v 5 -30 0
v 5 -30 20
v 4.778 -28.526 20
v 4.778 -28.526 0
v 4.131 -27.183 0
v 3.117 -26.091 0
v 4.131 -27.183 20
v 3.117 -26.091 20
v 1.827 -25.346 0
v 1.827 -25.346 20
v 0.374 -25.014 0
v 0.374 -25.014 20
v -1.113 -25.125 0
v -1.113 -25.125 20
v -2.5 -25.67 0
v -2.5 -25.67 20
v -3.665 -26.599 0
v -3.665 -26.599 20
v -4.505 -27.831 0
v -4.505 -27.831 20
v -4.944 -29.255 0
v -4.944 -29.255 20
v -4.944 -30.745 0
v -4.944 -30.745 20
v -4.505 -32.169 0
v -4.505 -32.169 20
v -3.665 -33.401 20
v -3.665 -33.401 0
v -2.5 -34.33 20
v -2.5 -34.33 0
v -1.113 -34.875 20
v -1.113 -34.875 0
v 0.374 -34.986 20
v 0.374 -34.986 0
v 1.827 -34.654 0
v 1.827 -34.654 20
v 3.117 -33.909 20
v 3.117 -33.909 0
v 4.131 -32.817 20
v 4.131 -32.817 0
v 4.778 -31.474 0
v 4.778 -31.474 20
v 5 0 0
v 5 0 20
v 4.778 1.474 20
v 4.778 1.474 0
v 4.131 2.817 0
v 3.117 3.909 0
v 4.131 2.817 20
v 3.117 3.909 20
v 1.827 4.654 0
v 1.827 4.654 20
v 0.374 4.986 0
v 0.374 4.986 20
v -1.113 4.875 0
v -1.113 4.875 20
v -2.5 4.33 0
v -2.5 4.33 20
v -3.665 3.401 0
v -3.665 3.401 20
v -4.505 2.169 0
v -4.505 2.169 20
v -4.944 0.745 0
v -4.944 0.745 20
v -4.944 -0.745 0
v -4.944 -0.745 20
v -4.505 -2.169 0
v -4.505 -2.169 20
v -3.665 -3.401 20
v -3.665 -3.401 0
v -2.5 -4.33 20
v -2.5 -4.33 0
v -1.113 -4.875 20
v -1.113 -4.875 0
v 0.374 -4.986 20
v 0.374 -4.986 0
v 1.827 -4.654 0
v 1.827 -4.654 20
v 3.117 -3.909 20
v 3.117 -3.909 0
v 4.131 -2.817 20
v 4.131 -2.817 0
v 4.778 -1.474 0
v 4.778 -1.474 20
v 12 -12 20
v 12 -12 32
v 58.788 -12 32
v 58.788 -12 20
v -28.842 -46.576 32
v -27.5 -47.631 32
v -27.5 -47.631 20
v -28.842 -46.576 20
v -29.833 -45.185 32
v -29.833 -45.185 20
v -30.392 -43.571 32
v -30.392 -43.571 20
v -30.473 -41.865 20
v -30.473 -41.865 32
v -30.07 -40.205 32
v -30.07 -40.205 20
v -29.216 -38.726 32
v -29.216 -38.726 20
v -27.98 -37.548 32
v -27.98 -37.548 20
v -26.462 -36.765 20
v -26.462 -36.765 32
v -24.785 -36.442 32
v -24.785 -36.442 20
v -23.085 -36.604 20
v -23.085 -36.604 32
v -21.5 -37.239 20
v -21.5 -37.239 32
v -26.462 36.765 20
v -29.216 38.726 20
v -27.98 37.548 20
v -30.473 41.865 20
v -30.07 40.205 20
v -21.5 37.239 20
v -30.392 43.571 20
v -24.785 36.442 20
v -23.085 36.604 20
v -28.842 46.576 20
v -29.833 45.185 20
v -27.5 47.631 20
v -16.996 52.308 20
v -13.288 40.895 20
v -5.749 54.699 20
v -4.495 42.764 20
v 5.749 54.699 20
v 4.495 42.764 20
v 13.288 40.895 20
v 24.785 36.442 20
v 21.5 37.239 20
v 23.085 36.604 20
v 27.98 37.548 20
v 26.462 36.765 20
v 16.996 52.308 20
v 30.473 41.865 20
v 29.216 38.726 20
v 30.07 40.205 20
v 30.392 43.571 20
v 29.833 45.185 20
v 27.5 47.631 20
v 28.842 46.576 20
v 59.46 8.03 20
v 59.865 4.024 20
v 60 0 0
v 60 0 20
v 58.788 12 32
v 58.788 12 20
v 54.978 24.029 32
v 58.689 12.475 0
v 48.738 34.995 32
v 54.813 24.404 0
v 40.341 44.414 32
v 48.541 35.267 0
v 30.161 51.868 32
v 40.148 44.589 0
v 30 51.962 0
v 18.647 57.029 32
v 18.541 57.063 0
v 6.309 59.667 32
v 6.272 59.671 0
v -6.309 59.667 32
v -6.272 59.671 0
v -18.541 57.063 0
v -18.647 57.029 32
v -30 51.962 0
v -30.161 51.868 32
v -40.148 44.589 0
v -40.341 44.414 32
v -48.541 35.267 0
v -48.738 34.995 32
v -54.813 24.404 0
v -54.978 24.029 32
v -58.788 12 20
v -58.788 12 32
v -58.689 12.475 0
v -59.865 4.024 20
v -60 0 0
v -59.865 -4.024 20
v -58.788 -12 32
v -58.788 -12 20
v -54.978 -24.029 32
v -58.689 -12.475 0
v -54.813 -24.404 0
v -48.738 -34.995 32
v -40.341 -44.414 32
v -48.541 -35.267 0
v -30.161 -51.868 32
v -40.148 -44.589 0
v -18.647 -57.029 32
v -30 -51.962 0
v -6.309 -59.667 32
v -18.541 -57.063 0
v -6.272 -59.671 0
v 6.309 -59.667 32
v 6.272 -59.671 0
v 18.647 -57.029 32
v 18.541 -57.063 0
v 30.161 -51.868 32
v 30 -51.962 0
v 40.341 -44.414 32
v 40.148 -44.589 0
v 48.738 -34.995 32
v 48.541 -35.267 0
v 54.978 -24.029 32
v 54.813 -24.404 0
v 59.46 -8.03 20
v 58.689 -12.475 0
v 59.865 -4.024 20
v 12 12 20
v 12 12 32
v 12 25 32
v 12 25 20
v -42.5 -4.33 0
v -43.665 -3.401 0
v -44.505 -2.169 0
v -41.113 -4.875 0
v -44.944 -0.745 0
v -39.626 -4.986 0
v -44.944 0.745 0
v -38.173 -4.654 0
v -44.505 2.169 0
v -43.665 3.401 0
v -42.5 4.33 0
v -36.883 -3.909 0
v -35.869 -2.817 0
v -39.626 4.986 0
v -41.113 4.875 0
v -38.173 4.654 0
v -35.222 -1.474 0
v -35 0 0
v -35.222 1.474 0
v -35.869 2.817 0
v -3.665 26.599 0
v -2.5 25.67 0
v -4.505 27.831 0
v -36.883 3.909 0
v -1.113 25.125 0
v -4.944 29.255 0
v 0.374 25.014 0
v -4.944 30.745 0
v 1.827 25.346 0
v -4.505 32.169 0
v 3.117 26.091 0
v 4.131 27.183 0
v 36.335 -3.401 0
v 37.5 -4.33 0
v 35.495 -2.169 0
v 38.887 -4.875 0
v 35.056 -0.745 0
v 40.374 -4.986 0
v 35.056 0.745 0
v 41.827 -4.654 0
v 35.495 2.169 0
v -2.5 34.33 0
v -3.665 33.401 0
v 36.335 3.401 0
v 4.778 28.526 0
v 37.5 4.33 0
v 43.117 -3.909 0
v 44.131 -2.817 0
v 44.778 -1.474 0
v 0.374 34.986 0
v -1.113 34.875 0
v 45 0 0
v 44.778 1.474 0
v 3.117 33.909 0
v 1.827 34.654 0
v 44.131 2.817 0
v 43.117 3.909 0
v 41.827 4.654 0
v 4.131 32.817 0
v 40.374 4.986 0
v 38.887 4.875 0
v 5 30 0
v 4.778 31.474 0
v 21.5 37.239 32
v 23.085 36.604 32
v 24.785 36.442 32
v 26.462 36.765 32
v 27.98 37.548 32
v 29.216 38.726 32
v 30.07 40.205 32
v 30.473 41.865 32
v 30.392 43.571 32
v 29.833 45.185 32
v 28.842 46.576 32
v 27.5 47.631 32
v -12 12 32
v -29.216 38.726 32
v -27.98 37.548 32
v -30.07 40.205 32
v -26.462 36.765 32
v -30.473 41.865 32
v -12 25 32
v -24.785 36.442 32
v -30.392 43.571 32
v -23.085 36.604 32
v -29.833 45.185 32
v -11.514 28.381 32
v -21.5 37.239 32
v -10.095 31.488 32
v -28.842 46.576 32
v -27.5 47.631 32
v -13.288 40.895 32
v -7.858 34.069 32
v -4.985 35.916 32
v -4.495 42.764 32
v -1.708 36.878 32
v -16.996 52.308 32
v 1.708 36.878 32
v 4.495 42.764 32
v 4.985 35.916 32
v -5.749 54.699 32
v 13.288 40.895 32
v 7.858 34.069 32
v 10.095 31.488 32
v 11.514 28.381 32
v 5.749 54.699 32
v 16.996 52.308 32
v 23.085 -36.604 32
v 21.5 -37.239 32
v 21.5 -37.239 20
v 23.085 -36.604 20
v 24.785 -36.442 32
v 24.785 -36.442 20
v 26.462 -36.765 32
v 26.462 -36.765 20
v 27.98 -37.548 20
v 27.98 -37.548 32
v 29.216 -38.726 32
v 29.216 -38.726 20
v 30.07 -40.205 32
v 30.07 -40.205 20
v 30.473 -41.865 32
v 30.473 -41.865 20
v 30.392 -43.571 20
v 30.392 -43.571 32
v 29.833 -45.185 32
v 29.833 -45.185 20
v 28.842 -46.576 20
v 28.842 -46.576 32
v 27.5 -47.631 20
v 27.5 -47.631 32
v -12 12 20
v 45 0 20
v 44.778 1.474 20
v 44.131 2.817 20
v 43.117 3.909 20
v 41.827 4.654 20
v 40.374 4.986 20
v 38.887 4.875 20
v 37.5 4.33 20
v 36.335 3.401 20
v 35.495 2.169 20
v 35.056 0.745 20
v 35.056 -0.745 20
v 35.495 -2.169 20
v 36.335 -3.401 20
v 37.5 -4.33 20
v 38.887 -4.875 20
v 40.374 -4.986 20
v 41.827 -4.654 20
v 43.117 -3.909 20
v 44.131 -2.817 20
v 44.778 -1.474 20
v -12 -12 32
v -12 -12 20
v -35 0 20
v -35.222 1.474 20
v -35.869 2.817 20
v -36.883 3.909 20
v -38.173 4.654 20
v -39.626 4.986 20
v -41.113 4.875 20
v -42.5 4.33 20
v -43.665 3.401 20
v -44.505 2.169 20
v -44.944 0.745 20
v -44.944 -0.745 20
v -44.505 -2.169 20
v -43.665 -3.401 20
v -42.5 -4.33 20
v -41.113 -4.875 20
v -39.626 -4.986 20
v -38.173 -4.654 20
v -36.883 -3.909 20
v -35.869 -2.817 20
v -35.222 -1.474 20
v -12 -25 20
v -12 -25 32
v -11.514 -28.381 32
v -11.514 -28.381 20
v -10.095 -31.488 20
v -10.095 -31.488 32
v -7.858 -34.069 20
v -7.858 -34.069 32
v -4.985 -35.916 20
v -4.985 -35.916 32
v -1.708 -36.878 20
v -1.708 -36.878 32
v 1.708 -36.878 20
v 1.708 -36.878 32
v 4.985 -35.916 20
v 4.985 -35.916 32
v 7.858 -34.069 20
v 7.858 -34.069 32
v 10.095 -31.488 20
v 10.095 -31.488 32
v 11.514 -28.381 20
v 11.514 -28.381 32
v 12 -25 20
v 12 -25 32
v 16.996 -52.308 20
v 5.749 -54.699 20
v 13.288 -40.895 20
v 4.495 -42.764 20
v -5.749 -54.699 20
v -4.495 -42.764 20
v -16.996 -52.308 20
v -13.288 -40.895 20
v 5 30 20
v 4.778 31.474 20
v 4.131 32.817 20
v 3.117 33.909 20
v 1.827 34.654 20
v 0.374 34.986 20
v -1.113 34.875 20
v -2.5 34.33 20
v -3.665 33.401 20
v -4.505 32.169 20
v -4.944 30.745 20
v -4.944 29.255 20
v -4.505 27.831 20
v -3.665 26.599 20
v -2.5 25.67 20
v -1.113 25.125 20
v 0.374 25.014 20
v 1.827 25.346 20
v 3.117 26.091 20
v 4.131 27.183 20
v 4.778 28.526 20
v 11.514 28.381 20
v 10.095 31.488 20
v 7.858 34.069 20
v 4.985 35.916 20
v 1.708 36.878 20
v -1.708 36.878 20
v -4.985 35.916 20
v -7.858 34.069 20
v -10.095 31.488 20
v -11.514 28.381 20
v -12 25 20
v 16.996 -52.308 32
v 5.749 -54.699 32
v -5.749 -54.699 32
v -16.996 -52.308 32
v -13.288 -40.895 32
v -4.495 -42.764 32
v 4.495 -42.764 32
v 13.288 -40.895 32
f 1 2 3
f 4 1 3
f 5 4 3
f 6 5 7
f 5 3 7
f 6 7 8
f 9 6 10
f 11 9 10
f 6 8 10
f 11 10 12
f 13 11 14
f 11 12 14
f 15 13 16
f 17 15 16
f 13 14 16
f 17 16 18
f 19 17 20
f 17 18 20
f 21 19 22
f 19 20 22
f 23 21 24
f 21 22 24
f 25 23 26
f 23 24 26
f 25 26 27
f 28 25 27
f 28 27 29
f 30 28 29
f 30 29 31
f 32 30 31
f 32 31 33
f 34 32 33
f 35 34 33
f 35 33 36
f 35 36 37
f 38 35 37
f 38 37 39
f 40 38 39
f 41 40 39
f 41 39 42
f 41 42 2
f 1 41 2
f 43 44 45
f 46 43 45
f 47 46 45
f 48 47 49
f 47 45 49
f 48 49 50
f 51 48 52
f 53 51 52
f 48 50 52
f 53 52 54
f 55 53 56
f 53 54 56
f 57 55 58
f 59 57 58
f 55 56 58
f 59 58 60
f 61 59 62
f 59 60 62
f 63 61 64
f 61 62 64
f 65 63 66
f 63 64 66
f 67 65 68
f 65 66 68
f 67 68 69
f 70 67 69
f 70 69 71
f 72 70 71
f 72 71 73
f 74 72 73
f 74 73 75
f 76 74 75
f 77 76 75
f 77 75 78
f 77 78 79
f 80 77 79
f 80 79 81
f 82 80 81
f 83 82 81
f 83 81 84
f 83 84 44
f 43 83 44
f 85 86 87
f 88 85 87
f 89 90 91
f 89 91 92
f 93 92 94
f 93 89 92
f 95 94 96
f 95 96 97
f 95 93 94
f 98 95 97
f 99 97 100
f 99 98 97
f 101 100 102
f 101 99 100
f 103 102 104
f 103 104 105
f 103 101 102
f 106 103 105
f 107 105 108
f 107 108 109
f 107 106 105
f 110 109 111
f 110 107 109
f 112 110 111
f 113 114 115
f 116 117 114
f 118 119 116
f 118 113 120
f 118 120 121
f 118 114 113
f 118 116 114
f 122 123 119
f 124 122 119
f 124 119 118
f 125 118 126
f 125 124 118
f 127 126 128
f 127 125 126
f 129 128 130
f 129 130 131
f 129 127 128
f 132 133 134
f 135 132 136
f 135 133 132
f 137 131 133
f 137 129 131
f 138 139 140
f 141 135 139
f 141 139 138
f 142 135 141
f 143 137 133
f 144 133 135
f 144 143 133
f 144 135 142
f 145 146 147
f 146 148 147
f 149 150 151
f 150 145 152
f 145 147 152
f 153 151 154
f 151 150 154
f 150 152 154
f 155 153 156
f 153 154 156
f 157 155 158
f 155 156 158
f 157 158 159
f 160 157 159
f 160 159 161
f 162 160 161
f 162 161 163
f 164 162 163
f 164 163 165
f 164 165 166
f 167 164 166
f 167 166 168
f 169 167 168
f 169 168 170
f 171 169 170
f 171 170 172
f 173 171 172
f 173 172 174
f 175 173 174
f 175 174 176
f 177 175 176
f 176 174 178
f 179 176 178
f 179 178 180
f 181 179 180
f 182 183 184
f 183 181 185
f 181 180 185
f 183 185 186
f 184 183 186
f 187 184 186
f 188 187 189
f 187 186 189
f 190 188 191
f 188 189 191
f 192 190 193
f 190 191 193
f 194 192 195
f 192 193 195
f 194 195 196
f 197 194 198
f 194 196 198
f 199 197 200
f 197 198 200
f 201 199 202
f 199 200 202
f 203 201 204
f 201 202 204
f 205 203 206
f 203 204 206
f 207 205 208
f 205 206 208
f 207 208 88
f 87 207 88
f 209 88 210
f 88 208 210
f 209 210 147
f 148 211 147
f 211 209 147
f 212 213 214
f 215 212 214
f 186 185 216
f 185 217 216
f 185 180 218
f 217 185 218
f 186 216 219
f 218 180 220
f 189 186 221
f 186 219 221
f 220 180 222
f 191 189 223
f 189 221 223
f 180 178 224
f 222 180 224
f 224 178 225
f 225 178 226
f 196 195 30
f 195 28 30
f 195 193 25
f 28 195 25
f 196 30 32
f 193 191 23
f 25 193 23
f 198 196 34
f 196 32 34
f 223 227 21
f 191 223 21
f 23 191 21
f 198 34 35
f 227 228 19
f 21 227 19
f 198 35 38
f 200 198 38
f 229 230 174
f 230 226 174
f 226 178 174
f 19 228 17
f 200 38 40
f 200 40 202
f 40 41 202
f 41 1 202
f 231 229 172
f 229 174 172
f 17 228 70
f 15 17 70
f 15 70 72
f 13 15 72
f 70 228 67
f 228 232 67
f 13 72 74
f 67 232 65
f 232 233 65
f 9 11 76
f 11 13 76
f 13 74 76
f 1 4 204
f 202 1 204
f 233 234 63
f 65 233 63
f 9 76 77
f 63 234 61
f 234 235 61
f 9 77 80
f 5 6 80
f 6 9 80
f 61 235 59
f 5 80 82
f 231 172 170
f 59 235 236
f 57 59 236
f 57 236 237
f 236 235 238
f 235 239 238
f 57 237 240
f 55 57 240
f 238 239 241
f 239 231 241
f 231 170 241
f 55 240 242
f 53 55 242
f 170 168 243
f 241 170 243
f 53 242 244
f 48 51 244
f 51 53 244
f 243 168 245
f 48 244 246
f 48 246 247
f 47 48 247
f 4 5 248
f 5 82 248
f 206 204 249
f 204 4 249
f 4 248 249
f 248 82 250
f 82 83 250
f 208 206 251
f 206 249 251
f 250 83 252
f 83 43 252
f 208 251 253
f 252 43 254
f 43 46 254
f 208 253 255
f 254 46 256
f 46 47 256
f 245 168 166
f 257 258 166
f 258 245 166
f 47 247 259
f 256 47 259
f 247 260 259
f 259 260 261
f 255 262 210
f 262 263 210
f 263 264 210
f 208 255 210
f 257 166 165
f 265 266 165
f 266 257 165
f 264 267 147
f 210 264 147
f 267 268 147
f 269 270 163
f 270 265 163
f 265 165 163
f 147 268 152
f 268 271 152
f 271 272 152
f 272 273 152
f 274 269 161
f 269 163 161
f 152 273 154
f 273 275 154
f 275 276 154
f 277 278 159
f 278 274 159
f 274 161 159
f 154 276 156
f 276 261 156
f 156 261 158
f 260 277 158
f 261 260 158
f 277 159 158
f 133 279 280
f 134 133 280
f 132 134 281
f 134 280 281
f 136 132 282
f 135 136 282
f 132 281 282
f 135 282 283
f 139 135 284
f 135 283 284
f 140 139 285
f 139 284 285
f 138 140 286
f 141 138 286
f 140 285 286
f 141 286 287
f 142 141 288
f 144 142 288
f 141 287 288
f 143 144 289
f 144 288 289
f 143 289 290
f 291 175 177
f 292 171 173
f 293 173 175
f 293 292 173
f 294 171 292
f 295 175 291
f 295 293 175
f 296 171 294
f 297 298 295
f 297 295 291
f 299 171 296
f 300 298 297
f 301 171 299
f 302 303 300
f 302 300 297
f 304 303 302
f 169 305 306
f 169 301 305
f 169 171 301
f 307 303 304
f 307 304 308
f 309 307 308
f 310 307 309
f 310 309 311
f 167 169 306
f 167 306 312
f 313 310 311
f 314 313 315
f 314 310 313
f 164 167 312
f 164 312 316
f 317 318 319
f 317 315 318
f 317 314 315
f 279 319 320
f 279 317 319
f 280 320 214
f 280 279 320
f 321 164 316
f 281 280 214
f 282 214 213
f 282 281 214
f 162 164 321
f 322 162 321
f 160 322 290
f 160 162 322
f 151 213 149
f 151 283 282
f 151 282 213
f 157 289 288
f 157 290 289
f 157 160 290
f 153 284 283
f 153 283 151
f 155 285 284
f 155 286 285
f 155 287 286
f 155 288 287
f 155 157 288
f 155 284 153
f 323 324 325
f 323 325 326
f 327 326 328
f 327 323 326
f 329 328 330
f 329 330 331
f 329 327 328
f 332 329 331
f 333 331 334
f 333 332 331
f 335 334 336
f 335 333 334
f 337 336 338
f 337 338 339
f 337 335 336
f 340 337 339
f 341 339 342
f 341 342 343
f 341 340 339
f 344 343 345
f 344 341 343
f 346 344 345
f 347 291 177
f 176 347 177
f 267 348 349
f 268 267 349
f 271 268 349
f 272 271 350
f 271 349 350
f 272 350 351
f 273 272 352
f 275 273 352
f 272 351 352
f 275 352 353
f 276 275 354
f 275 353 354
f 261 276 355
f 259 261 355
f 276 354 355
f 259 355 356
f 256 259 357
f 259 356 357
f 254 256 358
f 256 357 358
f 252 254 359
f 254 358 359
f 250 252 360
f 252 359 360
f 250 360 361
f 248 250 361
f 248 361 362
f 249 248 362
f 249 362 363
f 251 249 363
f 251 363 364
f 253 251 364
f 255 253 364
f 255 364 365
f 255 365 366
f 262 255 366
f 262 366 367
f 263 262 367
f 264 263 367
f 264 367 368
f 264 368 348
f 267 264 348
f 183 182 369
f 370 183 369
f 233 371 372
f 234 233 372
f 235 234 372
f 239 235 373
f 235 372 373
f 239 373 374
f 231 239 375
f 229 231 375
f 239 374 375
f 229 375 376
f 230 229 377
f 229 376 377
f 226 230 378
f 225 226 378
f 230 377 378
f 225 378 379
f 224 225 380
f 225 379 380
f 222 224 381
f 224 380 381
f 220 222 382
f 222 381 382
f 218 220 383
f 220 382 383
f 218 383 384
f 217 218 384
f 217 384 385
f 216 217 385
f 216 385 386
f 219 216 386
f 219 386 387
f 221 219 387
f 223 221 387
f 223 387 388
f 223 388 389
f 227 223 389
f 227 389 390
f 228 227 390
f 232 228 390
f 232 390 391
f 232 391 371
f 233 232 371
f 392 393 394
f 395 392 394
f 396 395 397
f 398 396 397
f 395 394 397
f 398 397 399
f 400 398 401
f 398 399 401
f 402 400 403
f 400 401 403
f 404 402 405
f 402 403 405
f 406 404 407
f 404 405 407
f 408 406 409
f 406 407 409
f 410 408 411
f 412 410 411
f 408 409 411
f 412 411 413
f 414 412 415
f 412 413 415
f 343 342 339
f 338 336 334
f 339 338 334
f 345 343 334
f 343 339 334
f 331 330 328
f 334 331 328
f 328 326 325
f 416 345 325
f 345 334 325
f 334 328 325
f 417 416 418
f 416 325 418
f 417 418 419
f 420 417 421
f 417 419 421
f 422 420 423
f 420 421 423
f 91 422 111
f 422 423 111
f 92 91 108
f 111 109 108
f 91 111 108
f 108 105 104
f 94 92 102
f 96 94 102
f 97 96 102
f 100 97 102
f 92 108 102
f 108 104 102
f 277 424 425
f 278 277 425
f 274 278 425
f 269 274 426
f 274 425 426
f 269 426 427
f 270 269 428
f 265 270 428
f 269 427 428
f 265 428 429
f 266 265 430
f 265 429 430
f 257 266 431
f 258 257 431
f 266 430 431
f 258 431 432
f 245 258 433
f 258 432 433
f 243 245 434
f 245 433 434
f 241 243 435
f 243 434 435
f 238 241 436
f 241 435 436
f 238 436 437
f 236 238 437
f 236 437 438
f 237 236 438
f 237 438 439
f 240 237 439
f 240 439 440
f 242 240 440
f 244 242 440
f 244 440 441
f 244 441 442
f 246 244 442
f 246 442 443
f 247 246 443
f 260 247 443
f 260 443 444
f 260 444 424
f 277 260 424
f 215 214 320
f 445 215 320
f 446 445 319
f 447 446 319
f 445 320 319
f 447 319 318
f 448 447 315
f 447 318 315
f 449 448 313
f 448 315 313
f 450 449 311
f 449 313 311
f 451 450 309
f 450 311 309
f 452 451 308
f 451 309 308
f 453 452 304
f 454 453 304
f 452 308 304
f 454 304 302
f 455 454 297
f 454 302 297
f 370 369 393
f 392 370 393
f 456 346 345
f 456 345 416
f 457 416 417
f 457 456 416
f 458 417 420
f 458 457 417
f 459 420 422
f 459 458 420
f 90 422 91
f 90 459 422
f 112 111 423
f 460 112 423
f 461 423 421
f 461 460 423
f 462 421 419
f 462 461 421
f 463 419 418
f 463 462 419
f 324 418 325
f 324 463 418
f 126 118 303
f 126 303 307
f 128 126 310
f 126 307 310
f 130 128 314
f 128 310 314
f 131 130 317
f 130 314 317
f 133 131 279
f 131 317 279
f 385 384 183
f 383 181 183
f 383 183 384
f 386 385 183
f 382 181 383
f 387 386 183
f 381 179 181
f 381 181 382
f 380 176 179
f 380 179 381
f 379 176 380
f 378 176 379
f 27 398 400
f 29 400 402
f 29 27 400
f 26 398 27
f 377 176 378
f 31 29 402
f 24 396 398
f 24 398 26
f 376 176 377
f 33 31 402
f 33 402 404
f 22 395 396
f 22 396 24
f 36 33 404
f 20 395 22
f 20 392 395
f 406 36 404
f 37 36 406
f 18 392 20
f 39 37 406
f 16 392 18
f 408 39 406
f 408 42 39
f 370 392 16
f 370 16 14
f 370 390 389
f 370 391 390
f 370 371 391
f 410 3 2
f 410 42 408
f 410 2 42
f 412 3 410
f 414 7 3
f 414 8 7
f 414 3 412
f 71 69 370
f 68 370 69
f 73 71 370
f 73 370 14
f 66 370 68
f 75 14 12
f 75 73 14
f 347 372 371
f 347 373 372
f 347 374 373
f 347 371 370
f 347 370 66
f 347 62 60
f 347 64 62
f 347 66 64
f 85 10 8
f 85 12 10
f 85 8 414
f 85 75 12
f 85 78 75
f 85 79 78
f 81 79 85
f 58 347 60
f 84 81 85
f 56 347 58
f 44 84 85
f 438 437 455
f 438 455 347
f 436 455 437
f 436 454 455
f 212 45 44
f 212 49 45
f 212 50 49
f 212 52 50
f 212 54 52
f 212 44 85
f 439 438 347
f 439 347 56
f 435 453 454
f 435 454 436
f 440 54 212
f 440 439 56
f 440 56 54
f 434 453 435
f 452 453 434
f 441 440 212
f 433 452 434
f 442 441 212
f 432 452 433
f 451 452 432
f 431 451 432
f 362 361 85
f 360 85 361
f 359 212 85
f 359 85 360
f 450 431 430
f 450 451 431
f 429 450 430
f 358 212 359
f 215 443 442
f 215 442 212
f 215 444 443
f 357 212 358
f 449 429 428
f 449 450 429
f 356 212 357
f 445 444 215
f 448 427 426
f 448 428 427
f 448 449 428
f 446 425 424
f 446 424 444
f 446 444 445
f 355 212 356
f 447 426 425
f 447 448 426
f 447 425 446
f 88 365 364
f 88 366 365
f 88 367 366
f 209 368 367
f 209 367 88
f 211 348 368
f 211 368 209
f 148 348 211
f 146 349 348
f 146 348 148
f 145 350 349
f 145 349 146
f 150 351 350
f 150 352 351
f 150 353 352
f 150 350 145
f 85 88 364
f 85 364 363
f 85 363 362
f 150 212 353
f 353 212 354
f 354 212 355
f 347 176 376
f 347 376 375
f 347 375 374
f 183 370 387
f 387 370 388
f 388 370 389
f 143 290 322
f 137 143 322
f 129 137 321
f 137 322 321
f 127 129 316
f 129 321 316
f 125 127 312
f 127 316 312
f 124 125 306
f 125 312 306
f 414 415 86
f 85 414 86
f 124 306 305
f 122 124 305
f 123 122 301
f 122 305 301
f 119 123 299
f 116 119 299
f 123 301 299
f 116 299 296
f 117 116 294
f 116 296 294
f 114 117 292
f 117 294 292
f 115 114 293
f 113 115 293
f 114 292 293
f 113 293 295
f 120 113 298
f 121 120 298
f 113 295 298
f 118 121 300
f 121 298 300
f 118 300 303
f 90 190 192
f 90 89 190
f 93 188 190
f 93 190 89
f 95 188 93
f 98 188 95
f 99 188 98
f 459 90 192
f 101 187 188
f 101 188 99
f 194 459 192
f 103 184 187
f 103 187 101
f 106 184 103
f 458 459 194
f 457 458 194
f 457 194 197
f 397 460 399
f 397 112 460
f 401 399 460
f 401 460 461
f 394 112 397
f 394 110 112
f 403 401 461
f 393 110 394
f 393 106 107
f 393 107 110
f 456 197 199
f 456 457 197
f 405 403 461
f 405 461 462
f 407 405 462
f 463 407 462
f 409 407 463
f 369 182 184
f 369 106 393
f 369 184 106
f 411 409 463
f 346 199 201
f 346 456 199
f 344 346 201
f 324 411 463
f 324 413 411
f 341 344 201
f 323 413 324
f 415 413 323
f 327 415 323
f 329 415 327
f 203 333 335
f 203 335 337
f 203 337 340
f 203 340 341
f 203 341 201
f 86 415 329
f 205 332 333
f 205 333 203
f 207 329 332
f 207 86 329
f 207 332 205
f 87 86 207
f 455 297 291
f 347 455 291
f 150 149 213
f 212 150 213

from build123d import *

# Parameters (mm, degrees)
SKETCH1_R           = 60
BOSS_EXTRUDE1_DEPTH = 32
CUT_EXTRUDE1_DEPTH  = 12
CUT_EXTRUDE2_DEPTH  = 12
SKETCH4_R           = 5
CUT_EXTRUDE3_DEPTH  = 92


with BuildPart() as part:
    # Sketch1 → Boss-Extrude1 (new body)
    with BuildSketch(Plane.XY):
        Circle(SKETCH1_R)
    extrude(amount=BOSS_EXTRUDE1_DEPTH)

    # Sketch2 → Cut-Extrude1 (cut)
    with BuildSketch(Plane.XY.offset(32)):
        with BuildLine():
            Line((12, -12), (72.488491821, -12))
            Line((72.488491821, -12), (72.488491821, 12))
            Line((72.488491821, 12), (12, 12))
            Line((12, 12), (12, 25))
            ThreePointArc((12, 25), (0, 37), (-12, 25))
            Line((-12, 25), (-12, 12))
            Line((-12, 12), (-72.488491821, 12))
            Line((-72.488491821, 12), (-72.488491821, -12))
            Line((-72.488491821, -12), (-12, -12))
            Line((-12, -12), (-12, -25))
            ThreePointArc((-12, -25), (0, -37), (12, -25))
            Line((12, -25), (12, -12))
        make_face()
    extrude(amount=-CUT_EXTRUDE1_DEPTH, mode=Mode.SUBTRACT)

    # Sketch3 → Cut-Extrude2 (cut)
    with BuildSketch(Plane.XY.offset(32)):
        with BuildLine():
            ThreePointArc((21.5, -37.239092363), (29.696152423, -39.435244785), (27.5, -47.631397208))
            ThreePointArc((27.5, -47.631397208), (0, -55), (-27.5, -47.631397208))
            ThreePointArc((-27.5, -47.631397208), (-29.696152423, -39.435244785), (-21.5, -37.239092363))
            ThreePointArc((-21.5, -37.239092363), (0, -43), (21.5, -37.239092363))
        make_face()
        with BuildLine():
            ThreePointArc((27.5, 47.631397208), (0, 55), (-27.5, 47.631397208))
            ThreePointArc((-27.5, 47.631397208), (-29.696152423, 39.435244785), (-21.5, 37.239092363))
            ThreePointArc((-21.5, 37.239092363), (0, 43), (21.5, 37.239092363))
            ThreePointArc((21.5, 37.239092363), (29.696152423, 39.435244785), (27.5, 47.631397208))
        make_face()
    extrude(amount=-CUT_EXTRUDE2_DEPTH, mode=Mode.SUBTRACT)

    # Sketch4 → Cut-Extrude3 (cut)
    with BuildSketch(Plane.XY.offset(20)):
        Circle(SKETCH4_R)
        with Locations((40, 0)):
            Circle(SKETCH4_R)
        with Locations((0, 30)):
            Circle(SKETCH4_R)
        with Locations((0, -30)):
            Circle(SKETCH4_R)
        with Locations((-40, 0)):
            Circle(SKETCH4_R)
    extrude(amount=-CUT_EXTRUDE3_DEPTH, mode=Mode.SUBTRACT)


solid = part.part
